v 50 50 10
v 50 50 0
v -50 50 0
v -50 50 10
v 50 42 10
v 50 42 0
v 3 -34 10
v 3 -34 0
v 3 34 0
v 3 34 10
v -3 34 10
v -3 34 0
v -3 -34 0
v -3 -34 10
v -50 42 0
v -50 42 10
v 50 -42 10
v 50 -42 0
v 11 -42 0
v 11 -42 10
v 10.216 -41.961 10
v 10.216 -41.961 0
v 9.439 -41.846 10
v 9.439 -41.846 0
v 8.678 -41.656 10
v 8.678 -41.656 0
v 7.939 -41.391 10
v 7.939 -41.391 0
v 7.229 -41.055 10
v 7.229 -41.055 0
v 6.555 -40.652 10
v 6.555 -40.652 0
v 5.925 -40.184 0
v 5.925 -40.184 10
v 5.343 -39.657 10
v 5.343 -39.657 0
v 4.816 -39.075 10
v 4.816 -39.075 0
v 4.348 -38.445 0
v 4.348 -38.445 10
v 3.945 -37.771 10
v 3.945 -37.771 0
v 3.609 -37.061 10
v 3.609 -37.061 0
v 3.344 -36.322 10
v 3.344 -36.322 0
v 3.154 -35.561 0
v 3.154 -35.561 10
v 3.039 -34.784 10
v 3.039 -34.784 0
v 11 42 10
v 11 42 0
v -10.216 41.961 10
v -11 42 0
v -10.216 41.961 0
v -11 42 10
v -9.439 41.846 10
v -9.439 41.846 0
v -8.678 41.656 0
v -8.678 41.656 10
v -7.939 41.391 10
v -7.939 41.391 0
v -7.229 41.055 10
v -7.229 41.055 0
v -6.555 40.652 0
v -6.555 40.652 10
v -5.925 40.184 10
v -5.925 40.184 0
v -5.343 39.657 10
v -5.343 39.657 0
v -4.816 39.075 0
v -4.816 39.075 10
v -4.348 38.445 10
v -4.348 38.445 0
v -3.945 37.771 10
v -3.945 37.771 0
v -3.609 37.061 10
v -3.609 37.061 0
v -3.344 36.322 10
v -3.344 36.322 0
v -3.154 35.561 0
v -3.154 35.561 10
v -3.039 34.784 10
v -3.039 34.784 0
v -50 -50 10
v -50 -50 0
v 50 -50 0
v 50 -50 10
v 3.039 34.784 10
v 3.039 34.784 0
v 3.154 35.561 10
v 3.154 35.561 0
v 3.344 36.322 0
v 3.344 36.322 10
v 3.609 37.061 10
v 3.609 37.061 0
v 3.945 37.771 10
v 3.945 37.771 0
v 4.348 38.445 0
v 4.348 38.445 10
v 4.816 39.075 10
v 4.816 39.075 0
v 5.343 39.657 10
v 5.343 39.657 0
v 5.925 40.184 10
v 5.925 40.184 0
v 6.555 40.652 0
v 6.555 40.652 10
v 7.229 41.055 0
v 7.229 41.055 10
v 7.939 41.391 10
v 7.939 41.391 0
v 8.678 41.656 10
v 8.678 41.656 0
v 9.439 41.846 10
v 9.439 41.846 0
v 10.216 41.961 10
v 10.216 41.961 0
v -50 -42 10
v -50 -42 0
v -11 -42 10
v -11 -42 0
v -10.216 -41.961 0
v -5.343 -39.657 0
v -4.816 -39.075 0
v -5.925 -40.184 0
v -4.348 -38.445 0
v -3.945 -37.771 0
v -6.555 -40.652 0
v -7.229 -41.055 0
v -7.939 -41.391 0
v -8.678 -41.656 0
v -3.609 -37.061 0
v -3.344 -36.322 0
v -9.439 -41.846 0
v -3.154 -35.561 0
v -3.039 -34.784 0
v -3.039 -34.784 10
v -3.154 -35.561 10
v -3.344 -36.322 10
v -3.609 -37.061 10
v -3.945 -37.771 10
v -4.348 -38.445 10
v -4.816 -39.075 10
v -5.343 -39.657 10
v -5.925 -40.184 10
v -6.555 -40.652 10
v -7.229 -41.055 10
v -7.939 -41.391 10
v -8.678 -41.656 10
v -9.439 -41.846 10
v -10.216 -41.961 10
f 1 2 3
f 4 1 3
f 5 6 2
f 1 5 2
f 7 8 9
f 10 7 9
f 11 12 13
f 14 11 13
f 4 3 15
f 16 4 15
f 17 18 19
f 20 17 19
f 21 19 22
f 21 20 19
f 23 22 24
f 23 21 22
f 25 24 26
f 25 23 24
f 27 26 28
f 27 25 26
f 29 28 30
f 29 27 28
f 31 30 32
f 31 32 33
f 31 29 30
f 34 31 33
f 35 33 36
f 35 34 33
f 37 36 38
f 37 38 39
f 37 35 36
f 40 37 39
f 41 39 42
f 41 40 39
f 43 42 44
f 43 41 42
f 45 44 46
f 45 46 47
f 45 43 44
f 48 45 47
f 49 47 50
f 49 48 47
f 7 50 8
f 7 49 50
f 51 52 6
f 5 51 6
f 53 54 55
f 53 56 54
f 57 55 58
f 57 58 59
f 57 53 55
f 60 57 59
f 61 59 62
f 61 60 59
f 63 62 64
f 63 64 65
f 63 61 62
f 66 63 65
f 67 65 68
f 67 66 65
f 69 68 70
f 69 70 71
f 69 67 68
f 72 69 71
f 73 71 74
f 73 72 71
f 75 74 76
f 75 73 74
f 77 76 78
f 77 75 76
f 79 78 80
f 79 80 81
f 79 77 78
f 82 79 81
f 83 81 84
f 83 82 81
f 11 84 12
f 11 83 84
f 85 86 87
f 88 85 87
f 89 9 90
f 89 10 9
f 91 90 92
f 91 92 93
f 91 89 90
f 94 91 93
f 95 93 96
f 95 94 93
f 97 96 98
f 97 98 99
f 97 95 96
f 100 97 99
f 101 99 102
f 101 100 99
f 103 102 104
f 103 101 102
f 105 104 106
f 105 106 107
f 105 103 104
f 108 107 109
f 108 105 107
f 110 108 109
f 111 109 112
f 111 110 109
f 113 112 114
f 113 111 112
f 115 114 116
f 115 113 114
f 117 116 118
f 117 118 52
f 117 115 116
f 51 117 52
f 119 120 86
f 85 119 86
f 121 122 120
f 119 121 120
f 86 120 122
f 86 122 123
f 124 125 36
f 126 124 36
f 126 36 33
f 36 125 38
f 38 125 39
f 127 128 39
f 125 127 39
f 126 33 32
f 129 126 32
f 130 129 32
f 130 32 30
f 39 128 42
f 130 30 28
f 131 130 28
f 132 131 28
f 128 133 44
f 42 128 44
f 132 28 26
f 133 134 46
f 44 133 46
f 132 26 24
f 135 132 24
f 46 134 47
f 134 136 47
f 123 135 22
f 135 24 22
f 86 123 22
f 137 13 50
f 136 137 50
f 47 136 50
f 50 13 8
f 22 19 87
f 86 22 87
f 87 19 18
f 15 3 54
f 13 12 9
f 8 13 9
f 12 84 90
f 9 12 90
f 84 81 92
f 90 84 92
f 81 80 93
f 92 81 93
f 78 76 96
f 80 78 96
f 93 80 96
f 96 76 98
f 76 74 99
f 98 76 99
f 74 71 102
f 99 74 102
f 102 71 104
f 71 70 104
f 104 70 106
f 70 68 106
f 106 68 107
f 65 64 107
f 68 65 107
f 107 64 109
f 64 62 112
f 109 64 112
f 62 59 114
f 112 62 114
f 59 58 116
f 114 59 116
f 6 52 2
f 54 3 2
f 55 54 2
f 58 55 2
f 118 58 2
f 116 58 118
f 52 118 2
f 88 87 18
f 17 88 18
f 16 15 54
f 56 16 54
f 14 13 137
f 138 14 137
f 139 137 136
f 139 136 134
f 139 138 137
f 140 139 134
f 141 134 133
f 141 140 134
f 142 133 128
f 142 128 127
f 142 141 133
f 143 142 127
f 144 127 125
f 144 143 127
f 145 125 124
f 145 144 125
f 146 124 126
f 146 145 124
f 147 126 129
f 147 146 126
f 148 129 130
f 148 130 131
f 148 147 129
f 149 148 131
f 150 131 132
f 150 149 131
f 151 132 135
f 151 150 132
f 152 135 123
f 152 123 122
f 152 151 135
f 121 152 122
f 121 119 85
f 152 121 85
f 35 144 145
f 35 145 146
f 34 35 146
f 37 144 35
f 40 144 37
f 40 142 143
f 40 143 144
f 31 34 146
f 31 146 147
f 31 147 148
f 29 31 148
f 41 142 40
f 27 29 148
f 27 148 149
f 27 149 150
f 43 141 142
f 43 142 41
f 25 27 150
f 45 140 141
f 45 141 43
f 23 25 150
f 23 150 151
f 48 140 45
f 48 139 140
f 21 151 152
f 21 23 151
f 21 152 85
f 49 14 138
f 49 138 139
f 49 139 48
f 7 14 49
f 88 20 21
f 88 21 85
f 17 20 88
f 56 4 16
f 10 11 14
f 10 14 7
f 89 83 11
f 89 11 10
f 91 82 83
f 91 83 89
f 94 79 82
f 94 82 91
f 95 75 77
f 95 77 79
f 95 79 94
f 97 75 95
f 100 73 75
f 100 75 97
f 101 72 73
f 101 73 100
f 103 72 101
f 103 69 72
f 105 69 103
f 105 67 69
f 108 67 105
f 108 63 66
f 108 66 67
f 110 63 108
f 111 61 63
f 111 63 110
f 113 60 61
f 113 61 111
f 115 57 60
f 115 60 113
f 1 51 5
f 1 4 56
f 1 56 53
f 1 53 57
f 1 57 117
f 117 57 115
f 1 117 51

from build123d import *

# Parameters (mm, degrees)
EXTRUDE_1_DEPTH = 10
FILLET_1_R      = 8


with BuildPart() as part:
    # 草图1 → 凸台-拉伸1 (new body)
    with BuildSketch(Plane.XY):
        Polygon((50, 50), (-50, 50), (-50, 42), (-3, 42), (-3, -42), (-50, -42), (-50, -50), (50, -50), (50, -42), (3, -42), (3, 42), (50, 42), align=None)
    extrude(amount=EXTRUDE_1_DEPTH)

    # 圆角1
    fillet_1_edges = [part.edges().sort_by_distance(p)[0] for p in [
        (-3, -42, 5),
        (-3, 42, 5),
        (3, 42, 5),
        (3, -42, 5),
    ]]
    fillet(fillet_1_edges, radius=FILLET_1_R)


solid = part.part
